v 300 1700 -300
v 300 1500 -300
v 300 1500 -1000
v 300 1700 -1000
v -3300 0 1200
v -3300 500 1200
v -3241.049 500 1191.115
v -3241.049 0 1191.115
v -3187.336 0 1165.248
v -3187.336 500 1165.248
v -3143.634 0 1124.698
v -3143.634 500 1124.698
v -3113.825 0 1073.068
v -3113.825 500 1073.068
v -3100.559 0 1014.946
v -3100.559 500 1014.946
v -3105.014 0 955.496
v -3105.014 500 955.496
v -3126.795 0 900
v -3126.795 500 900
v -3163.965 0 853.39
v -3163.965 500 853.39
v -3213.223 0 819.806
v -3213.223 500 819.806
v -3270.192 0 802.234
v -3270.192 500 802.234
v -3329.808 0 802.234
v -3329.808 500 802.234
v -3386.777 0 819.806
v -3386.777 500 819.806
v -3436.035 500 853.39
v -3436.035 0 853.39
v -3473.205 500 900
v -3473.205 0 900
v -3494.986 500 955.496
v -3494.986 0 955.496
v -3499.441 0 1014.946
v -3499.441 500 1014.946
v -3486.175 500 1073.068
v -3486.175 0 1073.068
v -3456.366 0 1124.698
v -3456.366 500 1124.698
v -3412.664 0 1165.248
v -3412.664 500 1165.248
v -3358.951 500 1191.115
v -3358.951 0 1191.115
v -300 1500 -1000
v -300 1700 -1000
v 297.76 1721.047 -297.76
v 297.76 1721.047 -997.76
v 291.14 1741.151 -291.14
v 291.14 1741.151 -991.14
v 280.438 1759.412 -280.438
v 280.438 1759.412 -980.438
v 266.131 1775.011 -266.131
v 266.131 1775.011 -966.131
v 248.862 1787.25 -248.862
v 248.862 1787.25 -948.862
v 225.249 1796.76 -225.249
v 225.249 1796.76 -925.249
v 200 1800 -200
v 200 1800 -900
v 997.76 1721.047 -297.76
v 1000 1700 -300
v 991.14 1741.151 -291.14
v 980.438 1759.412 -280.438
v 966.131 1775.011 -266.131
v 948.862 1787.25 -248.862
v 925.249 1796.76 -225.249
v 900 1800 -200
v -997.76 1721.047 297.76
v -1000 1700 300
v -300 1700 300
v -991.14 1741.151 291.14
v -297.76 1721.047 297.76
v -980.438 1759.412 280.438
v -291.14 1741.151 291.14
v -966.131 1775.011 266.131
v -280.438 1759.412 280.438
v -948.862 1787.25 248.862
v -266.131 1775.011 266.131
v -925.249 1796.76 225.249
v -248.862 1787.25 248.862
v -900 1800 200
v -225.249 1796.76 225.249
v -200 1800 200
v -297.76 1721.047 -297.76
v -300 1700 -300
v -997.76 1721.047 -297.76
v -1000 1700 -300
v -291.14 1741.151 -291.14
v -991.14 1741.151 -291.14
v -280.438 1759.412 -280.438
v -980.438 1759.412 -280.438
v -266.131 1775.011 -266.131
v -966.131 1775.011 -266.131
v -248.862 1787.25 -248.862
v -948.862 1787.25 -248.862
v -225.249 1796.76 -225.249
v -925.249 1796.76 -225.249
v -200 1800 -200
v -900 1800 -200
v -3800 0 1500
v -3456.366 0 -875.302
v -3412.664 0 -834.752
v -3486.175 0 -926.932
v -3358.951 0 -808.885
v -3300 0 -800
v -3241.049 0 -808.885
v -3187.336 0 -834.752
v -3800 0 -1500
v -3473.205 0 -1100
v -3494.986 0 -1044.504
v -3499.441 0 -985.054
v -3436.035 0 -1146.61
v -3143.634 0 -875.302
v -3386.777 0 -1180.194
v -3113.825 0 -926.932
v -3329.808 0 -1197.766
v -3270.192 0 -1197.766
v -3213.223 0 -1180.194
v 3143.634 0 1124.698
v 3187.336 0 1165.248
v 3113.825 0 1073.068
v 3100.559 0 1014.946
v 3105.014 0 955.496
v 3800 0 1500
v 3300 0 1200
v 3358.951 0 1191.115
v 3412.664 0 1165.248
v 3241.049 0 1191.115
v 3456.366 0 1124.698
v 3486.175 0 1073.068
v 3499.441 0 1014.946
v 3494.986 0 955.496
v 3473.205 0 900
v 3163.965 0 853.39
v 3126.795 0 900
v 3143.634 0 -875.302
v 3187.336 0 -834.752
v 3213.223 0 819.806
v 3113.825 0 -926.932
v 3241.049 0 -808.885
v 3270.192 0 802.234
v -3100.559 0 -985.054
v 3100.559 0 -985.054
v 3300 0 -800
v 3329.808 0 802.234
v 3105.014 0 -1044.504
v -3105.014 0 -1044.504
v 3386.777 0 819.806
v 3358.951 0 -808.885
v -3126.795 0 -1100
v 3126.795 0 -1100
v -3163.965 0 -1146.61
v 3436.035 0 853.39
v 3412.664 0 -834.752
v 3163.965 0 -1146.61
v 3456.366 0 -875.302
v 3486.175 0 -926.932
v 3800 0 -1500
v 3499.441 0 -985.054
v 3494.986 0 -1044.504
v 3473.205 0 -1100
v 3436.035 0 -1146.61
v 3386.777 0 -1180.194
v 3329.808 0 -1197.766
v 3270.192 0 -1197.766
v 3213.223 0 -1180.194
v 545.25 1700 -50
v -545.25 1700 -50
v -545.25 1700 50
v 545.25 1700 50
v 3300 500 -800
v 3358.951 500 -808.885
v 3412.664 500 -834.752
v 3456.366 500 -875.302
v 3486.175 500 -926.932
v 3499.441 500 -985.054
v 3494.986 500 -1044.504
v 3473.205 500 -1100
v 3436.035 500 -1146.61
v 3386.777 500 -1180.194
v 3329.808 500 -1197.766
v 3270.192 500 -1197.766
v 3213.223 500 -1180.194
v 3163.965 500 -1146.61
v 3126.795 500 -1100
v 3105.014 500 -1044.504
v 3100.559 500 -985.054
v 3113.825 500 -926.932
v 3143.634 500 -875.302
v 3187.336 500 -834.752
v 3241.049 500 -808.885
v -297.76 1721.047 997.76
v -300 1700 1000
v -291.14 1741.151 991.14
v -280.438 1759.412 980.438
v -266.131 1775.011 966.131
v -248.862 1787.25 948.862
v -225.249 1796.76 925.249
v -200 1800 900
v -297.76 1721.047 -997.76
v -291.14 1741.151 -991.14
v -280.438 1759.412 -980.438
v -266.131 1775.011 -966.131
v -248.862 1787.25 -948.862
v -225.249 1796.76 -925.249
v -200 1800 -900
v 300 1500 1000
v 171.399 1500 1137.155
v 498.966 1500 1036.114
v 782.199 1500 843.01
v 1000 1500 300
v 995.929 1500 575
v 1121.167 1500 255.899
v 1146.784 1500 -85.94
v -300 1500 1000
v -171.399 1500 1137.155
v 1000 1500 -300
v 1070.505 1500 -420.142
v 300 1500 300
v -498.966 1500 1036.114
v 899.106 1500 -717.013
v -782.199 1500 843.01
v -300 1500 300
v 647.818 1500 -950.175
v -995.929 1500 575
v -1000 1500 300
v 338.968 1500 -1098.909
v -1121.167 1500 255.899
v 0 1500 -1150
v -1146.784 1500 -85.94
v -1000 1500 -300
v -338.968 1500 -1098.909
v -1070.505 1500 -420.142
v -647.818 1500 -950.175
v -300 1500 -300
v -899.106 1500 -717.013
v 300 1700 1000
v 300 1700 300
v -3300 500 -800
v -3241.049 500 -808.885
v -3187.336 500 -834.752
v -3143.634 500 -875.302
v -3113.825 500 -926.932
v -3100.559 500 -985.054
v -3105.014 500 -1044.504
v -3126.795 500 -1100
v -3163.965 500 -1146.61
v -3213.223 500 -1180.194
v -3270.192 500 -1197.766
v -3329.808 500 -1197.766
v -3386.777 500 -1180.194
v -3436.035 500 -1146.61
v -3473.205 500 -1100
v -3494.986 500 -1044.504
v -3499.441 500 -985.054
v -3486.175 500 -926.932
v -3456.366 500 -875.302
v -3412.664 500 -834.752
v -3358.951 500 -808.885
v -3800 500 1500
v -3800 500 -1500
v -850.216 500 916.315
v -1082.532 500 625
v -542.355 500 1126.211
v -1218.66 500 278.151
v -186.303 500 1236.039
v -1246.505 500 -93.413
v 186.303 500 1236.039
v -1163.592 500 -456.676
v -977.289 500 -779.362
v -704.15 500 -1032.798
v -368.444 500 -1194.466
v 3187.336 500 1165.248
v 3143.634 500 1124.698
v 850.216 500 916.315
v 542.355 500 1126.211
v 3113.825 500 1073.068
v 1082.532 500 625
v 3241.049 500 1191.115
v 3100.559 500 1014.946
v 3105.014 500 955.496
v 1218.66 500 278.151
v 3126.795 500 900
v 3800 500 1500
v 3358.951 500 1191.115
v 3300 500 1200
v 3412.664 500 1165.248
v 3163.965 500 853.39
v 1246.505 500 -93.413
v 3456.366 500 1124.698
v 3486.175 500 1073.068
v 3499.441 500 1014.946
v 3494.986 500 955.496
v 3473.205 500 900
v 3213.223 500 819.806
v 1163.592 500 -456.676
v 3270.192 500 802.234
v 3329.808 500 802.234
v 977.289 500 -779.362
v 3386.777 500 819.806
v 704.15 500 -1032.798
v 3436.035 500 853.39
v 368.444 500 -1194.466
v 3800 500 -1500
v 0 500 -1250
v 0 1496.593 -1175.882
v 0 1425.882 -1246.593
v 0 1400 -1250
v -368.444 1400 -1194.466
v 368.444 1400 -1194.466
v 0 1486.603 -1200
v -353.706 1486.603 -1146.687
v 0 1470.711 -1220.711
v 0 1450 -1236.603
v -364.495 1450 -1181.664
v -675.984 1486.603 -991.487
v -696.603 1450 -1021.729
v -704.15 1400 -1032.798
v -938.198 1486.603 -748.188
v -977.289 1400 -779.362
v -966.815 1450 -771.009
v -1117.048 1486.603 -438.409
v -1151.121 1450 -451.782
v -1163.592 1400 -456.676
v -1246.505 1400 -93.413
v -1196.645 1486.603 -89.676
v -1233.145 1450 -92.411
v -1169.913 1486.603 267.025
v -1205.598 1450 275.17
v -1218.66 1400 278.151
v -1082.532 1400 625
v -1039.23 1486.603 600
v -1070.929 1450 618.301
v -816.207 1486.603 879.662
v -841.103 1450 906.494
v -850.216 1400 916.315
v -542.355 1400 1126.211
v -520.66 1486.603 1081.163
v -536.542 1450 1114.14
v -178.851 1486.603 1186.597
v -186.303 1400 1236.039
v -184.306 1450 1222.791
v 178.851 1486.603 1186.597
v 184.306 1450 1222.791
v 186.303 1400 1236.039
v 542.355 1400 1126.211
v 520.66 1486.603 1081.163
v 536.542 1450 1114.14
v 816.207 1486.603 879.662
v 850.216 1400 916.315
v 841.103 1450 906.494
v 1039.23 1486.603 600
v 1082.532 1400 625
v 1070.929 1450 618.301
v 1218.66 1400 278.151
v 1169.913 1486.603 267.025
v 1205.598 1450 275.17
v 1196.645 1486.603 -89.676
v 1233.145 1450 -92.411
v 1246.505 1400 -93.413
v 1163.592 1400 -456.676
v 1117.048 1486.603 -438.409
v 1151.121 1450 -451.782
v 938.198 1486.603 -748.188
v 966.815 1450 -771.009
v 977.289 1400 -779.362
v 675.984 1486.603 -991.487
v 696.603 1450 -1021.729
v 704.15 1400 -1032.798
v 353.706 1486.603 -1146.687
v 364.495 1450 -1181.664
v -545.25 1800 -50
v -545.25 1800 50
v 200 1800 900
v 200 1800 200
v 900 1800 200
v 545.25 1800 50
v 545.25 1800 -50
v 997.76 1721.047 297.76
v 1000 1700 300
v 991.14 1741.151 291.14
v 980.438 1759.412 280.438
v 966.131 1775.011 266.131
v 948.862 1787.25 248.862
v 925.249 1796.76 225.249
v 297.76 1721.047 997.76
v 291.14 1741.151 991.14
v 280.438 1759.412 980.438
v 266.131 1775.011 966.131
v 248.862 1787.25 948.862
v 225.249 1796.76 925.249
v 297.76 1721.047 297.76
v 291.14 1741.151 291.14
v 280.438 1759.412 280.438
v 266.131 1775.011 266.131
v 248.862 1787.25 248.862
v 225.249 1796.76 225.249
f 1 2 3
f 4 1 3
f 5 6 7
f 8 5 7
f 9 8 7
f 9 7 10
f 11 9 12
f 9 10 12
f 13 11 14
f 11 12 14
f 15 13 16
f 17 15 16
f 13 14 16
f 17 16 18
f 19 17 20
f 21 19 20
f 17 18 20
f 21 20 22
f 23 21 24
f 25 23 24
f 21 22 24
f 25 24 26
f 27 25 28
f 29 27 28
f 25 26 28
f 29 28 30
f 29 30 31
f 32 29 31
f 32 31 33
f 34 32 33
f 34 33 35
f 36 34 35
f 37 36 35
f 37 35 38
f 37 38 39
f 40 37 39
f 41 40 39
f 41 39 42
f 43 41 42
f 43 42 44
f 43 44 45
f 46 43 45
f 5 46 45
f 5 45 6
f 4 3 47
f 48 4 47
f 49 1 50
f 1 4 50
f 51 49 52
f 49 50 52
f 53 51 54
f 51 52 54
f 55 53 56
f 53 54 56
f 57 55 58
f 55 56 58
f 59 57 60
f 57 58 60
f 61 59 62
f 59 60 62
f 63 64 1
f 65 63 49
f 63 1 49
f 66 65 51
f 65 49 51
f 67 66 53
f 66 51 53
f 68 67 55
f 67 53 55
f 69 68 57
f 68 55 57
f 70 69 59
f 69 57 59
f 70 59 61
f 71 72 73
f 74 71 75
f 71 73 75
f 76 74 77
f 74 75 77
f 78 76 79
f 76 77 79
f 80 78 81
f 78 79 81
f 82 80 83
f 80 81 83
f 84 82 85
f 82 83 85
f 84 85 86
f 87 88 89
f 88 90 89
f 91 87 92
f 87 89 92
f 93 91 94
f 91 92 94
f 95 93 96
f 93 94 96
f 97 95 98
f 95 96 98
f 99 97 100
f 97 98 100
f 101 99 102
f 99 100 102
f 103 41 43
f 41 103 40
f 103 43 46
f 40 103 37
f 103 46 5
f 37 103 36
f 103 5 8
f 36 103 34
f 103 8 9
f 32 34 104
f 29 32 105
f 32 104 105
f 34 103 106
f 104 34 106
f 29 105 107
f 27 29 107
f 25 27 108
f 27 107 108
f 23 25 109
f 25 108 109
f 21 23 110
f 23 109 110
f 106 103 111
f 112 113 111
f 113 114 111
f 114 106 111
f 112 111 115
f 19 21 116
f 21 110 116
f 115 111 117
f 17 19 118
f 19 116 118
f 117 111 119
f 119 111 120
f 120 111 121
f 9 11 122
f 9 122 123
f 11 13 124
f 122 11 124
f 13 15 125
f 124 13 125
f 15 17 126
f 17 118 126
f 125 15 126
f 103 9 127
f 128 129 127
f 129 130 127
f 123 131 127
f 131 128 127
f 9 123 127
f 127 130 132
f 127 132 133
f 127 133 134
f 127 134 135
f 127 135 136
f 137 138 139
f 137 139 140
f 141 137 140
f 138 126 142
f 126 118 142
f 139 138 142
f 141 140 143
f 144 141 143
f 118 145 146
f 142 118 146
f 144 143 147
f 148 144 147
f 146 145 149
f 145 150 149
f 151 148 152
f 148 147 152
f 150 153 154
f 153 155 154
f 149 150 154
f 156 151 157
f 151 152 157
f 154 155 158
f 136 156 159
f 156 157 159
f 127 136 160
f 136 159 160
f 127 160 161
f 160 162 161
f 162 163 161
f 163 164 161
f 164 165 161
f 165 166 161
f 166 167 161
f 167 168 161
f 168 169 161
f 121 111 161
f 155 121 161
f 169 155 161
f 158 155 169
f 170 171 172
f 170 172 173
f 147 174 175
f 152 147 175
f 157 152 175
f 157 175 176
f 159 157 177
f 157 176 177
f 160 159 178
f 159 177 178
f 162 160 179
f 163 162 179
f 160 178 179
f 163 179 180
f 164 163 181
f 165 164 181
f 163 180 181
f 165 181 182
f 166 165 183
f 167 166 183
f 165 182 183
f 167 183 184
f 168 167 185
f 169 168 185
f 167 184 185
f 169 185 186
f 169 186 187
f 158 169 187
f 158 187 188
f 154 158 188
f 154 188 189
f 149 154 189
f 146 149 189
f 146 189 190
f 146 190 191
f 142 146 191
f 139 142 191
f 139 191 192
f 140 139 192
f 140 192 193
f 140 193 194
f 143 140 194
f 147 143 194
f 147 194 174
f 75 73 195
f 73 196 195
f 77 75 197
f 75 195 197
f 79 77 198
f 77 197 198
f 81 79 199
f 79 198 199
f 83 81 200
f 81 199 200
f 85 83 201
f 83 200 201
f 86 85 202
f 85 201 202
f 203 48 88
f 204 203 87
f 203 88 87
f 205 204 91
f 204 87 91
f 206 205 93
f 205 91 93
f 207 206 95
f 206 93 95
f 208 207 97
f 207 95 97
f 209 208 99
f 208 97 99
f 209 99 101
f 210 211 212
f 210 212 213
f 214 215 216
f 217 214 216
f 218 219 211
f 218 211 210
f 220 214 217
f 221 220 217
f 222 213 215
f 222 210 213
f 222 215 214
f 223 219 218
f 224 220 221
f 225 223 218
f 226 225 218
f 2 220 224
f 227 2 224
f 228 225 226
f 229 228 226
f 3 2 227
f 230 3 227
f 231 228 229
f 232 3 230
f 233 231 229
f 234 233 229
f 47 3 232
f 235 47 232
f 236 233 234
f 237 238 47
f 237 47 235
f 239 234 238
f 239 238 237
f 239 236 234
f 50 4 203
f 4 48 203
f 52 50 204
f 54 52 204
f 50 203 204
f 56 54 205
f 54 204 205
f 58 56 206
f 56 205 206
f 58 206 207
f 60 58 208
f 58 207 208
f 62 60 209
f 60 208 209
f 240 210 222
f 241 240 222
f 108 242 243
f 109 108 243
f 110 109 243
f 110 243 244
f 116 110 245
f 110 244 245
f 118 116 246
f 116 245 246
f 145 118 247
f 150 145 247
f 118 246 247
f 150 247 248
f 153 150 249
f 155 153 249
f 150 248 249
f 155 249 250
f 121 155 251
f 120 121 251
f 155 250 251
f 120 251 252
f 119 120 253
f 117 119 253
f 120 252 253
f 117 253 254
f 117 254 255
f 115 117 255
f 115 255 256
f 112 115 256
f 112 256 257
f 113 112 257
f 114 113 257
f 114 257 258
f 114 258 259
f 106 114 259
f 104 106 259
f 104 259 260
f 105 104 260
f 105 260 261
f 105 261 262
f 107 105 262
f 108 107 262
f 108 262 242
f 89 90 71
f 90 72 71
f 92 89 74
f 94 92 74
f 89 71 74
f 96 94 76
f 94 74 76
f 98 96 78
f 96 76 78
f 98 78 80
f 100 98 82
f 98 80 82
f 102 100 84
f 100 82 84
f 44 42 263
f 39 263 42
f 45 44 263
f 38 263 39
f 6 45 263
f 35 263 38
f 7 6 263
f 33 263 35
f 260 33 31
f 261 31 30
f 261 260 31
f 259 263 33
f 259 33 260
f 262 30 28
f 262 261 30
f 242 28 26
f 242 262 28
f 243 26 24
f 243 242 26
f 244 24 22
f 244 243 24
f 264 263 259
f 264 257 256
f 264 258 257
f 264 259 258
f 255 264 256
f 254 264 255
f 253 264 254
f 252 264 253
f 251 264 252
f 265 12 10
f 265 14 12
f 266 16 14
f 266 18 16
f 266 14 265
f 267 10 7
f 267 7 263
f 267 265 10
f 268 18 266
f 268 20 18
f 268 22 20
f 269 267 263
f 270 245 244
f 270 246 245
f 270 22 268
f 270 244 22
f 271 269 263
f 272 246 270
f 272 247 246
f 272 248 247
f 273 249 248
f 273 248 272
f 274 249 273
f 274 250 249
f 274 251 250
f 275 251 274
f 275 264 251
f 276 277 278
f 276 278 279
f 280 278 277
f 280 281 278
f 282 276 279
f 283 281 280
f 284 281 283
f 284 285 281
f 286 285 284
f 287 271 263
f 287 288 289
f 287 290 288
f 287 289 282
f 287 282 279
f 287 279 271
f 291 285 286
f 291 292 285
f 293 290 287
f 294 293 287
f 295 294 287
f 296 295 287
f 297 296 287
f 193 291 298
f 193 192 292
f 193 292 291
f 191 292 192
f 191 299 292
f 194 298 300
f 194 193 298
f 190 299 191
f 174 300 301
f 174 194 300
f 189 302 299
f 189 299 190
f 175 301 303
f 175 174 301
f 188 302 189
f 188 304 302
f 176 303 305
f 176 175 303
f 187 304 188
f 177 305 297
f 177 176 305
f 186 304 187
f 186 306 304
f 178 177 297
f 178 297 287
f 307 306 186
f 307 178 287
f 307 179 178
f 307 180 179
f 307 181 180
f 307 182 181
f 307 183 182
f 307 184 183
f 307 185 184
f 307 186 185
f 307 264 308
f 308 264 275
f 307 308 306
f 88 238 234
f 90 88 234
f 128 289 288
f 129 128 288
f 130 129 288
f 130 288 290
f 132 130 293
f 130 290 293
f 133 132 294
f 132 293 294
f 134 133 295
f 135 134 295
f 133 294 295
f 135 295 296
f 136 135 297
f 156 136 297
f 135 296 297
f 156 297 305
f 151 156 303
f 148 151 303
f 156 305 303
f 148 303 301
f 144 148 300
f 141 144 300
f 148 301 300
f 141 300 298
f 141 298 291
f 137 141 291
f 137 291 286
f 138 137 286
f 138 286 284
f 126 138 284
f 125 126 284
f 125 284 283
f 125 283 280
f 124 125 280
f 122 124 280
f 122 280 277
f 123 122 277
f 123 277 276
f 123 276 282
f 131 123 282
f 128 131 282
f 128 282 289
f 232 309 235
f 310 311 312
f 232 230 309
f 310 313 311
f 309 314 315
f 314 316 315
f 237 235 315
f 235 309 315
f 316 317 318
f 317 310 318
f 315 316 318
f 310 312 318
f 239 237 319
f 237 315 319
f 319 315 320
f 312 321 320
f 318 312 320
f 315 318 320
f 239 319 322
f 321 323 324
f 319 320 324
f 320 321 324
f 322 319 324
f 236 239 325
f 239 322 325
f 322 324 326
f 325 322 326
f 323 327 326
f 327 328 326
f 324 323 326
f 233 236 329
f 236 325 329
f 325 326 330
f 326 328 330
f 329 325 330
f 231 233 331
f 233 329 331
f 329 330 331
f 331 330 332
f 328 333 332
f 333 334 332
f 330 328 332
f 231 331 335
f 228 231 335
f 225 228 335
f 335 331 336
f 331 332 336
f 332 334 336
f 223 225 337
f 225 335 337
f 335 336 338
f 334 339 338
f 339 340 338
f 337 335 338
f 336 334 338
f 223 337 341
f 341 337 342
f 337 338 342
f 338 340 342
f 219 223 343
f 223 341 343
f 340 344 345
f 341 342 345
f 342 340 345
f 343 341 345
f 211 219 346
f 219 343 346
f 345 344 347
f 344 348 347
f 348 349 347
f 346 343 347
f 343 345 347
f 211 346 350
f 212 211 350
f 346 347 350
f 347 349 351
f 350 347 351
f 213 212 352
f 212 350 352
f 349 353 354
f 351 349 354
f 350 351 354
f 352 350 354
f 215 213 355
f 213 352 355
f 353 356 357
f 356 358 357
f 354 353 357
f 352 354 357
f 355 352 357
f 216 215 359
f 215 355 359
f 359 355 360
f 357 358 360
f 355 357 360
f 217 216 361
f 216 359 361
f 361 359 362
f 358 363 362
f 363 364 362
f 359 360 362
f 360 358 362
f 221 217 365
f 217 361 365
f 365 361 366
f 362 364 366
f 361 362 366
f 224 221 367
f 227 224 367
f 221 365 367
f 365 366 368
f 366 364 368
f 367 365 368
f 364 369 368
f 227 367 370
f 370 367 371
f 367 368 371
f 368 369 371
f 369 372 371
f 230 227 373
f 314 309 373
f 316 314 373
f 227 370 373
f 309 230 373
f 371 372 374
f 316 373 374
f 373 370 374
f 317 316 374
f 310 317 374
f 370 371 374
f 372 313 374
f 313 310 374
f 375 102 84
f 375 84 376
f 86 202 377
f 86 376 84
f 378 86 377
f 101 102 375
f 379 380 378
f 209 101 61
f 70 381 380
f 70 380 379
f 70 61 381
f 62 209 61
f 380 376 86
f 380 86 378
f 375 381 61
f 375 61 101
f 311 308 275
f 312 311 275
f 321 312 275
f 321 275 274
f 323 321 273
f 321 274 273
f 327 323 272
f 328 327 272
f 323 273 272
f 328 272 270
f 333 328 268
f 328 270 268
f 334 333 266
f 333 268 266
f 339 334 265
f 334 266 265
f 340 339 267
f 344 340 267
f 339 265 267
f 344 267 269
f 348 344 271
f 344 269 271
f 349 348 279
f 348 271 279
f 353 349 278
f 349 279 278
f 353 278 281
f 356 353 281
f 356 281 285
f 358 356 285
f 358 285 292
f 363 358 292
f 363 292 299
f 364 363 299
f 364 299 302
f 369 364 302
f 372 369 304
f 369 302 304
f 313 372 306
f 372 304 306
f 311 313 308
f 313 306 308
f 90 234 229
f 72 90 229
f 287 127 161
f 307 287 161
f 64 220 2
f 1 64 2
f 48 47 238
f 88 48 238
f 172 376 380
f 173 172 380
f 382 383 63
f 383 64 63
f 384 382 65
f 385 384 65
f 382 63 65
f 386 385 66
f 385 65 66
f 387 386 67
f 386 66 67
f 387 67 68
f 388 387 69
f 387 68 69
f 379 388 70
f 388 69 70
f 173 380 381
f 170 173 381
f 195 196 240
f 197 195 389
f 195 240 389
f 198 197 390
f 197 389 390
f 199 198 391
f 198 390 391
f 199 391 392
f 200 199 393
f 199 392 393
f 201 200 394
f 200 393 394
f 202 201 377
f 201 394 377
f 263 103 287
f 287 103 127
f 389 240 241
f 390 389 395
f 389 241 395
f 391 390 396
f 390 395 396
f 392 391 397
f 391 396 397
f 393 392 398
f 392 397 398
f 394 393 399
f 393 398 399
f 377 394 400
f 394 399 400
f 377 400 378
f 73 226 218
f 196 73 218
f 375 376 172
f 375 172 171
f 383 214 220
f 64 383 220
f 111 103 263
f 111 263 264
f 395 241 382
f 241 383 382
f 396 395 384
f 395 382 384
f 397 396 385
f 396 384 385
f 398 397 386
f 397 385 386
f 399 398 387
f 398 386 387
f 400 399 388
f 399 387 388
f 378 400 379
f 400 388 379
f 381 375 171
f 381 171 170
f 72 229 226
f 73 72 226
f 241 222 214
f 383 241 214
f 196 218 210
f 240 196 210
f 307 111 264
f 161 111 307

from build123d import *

# Parameters (mm, degrees)
SKETCH1_W           = 7600
SKETCH1_H           = 3000
BOSS_EXTRUDE1_DEPTH = 500
SKETCH2_R           = 200
CUT_EXTRUDE1_DEPTH  = 1000
SKETCH3_R           = 1250
BOSS_EXTRUDE2_DEPTH = 1000
BOSS_EXTRUDE3_DEPTH = 300
FILLET1_R           = 100
FILLET2_R           = 100
SKETCH6_W           = 1090.5
SKETCH6_H           = 100
CUT_EXTRUDE2_DEPTH  = 100


with BuildPart() as part:
    # Sketch1 → Boss-Extrude1 (new body)
    with BuildSketch(Plane(origin=(0, 0, 0), x_dir=(1, 0, 0), z_dir=(0, 1, 0))):
        Rectangle(SKETCH1_W, SKETCH1_H)
    extrude(amount=BOSS_EXTRUDE1_DEPTH)

    # Sketch2 → Cut-Extrude1 (cut)
    with BuildSketch(Plane(origin=(0, 500, 0), x_dir=(1, 0, 0), z_dir=(0, 1, 0))):
        with Locations(Location((-3300, -1000, 0), (0, 0, 270))):
            Circle(SKETCH2_R)
        with Locations(Location((-3300, 1000, 0), (0, 0, 270))):
            Circle(SKETCH2_R)
        with Locations(Location((3300, 1000, 0), (0, 0, 270))):
            Circle(SKETCH2_R)
        with Locations(Location((3300, -1000, 0), (0, 0, 270))):
            Circle(SKETCH2_R)
    extrude(amount=-CUT_EXTRUDE1_DEPTH, mode=Mode.SUBTRACT)

    # Sketch3 → Boss-Extrude2 (add)
    with BuildSketch(Plane(origin=(0, 500, 0), x_dir=(1, 0, 0), z_dir=(0, 1, 0))):
        with Locations(Location((0, 0, 0), (0, 0, 90))):
            Circle(SKETCH3_R)
    extrude(amount=BOSS_EXTRUDE2_DEPTH)

    # Sketch4 → Boss-Extrude3 (add)
    with BuildSketch(Plane(origin=(0, 1500, 0), x_dir=(1, 0, 0), z_dir=(0, 1, 0))):
        Polygon((-300, -300), (-300, -1000), (300, -1000), (300, -300), (1000, -300), (1000, 300), (300, 300), (300, 1000), (-300, 1000), (-300, 300), (-1000, 300), (-1000, -300), align=None)
    extrude(amount=BOSS_EXTRUDE3_DEPTH)

    # Fillet1
    fillet1_edges = [part.edges().sort_by_distance(p)[0] for p in [
        (300, 1800, 650),
        (650, 1800, 300),
        (1000, 1800, 0),
        (650, 1800, -300),
        (300, 1800, -650),
        (0, 1800, -1000),
        (-300, 1800, -650),
        (-650, 1800, -300),
        (-1000, 1800, 0),
        (-650, 1800, 300),
        (-300, 1800, 650),
        (0, 1800, 1000),
    ]]
    fillet(fillet1_edges, radius=FILLET1_R)

    # Fillet2
    fillet2_edges = [part.edges().sort_by_distance(p)[0] for p in [
        (0, 1500, 1250),
    ]]
    fillet(fillet2_edges, radius=FILLET2_R)

    # Sketch6 → Cut-Extrude2 (cut)
    with BuildSketch(Plane(origin=(0, 1800, 0), x_dir=(1, 0, 0), z_dir=(0, 1, 0))):
        Rectangle(SKETCH6_W, SKETCH6_H)
    extrude(amount=-CUT_EXTRUDE2_DEPTH, mode=Mode.SUBTRACT)


solid = part.part
